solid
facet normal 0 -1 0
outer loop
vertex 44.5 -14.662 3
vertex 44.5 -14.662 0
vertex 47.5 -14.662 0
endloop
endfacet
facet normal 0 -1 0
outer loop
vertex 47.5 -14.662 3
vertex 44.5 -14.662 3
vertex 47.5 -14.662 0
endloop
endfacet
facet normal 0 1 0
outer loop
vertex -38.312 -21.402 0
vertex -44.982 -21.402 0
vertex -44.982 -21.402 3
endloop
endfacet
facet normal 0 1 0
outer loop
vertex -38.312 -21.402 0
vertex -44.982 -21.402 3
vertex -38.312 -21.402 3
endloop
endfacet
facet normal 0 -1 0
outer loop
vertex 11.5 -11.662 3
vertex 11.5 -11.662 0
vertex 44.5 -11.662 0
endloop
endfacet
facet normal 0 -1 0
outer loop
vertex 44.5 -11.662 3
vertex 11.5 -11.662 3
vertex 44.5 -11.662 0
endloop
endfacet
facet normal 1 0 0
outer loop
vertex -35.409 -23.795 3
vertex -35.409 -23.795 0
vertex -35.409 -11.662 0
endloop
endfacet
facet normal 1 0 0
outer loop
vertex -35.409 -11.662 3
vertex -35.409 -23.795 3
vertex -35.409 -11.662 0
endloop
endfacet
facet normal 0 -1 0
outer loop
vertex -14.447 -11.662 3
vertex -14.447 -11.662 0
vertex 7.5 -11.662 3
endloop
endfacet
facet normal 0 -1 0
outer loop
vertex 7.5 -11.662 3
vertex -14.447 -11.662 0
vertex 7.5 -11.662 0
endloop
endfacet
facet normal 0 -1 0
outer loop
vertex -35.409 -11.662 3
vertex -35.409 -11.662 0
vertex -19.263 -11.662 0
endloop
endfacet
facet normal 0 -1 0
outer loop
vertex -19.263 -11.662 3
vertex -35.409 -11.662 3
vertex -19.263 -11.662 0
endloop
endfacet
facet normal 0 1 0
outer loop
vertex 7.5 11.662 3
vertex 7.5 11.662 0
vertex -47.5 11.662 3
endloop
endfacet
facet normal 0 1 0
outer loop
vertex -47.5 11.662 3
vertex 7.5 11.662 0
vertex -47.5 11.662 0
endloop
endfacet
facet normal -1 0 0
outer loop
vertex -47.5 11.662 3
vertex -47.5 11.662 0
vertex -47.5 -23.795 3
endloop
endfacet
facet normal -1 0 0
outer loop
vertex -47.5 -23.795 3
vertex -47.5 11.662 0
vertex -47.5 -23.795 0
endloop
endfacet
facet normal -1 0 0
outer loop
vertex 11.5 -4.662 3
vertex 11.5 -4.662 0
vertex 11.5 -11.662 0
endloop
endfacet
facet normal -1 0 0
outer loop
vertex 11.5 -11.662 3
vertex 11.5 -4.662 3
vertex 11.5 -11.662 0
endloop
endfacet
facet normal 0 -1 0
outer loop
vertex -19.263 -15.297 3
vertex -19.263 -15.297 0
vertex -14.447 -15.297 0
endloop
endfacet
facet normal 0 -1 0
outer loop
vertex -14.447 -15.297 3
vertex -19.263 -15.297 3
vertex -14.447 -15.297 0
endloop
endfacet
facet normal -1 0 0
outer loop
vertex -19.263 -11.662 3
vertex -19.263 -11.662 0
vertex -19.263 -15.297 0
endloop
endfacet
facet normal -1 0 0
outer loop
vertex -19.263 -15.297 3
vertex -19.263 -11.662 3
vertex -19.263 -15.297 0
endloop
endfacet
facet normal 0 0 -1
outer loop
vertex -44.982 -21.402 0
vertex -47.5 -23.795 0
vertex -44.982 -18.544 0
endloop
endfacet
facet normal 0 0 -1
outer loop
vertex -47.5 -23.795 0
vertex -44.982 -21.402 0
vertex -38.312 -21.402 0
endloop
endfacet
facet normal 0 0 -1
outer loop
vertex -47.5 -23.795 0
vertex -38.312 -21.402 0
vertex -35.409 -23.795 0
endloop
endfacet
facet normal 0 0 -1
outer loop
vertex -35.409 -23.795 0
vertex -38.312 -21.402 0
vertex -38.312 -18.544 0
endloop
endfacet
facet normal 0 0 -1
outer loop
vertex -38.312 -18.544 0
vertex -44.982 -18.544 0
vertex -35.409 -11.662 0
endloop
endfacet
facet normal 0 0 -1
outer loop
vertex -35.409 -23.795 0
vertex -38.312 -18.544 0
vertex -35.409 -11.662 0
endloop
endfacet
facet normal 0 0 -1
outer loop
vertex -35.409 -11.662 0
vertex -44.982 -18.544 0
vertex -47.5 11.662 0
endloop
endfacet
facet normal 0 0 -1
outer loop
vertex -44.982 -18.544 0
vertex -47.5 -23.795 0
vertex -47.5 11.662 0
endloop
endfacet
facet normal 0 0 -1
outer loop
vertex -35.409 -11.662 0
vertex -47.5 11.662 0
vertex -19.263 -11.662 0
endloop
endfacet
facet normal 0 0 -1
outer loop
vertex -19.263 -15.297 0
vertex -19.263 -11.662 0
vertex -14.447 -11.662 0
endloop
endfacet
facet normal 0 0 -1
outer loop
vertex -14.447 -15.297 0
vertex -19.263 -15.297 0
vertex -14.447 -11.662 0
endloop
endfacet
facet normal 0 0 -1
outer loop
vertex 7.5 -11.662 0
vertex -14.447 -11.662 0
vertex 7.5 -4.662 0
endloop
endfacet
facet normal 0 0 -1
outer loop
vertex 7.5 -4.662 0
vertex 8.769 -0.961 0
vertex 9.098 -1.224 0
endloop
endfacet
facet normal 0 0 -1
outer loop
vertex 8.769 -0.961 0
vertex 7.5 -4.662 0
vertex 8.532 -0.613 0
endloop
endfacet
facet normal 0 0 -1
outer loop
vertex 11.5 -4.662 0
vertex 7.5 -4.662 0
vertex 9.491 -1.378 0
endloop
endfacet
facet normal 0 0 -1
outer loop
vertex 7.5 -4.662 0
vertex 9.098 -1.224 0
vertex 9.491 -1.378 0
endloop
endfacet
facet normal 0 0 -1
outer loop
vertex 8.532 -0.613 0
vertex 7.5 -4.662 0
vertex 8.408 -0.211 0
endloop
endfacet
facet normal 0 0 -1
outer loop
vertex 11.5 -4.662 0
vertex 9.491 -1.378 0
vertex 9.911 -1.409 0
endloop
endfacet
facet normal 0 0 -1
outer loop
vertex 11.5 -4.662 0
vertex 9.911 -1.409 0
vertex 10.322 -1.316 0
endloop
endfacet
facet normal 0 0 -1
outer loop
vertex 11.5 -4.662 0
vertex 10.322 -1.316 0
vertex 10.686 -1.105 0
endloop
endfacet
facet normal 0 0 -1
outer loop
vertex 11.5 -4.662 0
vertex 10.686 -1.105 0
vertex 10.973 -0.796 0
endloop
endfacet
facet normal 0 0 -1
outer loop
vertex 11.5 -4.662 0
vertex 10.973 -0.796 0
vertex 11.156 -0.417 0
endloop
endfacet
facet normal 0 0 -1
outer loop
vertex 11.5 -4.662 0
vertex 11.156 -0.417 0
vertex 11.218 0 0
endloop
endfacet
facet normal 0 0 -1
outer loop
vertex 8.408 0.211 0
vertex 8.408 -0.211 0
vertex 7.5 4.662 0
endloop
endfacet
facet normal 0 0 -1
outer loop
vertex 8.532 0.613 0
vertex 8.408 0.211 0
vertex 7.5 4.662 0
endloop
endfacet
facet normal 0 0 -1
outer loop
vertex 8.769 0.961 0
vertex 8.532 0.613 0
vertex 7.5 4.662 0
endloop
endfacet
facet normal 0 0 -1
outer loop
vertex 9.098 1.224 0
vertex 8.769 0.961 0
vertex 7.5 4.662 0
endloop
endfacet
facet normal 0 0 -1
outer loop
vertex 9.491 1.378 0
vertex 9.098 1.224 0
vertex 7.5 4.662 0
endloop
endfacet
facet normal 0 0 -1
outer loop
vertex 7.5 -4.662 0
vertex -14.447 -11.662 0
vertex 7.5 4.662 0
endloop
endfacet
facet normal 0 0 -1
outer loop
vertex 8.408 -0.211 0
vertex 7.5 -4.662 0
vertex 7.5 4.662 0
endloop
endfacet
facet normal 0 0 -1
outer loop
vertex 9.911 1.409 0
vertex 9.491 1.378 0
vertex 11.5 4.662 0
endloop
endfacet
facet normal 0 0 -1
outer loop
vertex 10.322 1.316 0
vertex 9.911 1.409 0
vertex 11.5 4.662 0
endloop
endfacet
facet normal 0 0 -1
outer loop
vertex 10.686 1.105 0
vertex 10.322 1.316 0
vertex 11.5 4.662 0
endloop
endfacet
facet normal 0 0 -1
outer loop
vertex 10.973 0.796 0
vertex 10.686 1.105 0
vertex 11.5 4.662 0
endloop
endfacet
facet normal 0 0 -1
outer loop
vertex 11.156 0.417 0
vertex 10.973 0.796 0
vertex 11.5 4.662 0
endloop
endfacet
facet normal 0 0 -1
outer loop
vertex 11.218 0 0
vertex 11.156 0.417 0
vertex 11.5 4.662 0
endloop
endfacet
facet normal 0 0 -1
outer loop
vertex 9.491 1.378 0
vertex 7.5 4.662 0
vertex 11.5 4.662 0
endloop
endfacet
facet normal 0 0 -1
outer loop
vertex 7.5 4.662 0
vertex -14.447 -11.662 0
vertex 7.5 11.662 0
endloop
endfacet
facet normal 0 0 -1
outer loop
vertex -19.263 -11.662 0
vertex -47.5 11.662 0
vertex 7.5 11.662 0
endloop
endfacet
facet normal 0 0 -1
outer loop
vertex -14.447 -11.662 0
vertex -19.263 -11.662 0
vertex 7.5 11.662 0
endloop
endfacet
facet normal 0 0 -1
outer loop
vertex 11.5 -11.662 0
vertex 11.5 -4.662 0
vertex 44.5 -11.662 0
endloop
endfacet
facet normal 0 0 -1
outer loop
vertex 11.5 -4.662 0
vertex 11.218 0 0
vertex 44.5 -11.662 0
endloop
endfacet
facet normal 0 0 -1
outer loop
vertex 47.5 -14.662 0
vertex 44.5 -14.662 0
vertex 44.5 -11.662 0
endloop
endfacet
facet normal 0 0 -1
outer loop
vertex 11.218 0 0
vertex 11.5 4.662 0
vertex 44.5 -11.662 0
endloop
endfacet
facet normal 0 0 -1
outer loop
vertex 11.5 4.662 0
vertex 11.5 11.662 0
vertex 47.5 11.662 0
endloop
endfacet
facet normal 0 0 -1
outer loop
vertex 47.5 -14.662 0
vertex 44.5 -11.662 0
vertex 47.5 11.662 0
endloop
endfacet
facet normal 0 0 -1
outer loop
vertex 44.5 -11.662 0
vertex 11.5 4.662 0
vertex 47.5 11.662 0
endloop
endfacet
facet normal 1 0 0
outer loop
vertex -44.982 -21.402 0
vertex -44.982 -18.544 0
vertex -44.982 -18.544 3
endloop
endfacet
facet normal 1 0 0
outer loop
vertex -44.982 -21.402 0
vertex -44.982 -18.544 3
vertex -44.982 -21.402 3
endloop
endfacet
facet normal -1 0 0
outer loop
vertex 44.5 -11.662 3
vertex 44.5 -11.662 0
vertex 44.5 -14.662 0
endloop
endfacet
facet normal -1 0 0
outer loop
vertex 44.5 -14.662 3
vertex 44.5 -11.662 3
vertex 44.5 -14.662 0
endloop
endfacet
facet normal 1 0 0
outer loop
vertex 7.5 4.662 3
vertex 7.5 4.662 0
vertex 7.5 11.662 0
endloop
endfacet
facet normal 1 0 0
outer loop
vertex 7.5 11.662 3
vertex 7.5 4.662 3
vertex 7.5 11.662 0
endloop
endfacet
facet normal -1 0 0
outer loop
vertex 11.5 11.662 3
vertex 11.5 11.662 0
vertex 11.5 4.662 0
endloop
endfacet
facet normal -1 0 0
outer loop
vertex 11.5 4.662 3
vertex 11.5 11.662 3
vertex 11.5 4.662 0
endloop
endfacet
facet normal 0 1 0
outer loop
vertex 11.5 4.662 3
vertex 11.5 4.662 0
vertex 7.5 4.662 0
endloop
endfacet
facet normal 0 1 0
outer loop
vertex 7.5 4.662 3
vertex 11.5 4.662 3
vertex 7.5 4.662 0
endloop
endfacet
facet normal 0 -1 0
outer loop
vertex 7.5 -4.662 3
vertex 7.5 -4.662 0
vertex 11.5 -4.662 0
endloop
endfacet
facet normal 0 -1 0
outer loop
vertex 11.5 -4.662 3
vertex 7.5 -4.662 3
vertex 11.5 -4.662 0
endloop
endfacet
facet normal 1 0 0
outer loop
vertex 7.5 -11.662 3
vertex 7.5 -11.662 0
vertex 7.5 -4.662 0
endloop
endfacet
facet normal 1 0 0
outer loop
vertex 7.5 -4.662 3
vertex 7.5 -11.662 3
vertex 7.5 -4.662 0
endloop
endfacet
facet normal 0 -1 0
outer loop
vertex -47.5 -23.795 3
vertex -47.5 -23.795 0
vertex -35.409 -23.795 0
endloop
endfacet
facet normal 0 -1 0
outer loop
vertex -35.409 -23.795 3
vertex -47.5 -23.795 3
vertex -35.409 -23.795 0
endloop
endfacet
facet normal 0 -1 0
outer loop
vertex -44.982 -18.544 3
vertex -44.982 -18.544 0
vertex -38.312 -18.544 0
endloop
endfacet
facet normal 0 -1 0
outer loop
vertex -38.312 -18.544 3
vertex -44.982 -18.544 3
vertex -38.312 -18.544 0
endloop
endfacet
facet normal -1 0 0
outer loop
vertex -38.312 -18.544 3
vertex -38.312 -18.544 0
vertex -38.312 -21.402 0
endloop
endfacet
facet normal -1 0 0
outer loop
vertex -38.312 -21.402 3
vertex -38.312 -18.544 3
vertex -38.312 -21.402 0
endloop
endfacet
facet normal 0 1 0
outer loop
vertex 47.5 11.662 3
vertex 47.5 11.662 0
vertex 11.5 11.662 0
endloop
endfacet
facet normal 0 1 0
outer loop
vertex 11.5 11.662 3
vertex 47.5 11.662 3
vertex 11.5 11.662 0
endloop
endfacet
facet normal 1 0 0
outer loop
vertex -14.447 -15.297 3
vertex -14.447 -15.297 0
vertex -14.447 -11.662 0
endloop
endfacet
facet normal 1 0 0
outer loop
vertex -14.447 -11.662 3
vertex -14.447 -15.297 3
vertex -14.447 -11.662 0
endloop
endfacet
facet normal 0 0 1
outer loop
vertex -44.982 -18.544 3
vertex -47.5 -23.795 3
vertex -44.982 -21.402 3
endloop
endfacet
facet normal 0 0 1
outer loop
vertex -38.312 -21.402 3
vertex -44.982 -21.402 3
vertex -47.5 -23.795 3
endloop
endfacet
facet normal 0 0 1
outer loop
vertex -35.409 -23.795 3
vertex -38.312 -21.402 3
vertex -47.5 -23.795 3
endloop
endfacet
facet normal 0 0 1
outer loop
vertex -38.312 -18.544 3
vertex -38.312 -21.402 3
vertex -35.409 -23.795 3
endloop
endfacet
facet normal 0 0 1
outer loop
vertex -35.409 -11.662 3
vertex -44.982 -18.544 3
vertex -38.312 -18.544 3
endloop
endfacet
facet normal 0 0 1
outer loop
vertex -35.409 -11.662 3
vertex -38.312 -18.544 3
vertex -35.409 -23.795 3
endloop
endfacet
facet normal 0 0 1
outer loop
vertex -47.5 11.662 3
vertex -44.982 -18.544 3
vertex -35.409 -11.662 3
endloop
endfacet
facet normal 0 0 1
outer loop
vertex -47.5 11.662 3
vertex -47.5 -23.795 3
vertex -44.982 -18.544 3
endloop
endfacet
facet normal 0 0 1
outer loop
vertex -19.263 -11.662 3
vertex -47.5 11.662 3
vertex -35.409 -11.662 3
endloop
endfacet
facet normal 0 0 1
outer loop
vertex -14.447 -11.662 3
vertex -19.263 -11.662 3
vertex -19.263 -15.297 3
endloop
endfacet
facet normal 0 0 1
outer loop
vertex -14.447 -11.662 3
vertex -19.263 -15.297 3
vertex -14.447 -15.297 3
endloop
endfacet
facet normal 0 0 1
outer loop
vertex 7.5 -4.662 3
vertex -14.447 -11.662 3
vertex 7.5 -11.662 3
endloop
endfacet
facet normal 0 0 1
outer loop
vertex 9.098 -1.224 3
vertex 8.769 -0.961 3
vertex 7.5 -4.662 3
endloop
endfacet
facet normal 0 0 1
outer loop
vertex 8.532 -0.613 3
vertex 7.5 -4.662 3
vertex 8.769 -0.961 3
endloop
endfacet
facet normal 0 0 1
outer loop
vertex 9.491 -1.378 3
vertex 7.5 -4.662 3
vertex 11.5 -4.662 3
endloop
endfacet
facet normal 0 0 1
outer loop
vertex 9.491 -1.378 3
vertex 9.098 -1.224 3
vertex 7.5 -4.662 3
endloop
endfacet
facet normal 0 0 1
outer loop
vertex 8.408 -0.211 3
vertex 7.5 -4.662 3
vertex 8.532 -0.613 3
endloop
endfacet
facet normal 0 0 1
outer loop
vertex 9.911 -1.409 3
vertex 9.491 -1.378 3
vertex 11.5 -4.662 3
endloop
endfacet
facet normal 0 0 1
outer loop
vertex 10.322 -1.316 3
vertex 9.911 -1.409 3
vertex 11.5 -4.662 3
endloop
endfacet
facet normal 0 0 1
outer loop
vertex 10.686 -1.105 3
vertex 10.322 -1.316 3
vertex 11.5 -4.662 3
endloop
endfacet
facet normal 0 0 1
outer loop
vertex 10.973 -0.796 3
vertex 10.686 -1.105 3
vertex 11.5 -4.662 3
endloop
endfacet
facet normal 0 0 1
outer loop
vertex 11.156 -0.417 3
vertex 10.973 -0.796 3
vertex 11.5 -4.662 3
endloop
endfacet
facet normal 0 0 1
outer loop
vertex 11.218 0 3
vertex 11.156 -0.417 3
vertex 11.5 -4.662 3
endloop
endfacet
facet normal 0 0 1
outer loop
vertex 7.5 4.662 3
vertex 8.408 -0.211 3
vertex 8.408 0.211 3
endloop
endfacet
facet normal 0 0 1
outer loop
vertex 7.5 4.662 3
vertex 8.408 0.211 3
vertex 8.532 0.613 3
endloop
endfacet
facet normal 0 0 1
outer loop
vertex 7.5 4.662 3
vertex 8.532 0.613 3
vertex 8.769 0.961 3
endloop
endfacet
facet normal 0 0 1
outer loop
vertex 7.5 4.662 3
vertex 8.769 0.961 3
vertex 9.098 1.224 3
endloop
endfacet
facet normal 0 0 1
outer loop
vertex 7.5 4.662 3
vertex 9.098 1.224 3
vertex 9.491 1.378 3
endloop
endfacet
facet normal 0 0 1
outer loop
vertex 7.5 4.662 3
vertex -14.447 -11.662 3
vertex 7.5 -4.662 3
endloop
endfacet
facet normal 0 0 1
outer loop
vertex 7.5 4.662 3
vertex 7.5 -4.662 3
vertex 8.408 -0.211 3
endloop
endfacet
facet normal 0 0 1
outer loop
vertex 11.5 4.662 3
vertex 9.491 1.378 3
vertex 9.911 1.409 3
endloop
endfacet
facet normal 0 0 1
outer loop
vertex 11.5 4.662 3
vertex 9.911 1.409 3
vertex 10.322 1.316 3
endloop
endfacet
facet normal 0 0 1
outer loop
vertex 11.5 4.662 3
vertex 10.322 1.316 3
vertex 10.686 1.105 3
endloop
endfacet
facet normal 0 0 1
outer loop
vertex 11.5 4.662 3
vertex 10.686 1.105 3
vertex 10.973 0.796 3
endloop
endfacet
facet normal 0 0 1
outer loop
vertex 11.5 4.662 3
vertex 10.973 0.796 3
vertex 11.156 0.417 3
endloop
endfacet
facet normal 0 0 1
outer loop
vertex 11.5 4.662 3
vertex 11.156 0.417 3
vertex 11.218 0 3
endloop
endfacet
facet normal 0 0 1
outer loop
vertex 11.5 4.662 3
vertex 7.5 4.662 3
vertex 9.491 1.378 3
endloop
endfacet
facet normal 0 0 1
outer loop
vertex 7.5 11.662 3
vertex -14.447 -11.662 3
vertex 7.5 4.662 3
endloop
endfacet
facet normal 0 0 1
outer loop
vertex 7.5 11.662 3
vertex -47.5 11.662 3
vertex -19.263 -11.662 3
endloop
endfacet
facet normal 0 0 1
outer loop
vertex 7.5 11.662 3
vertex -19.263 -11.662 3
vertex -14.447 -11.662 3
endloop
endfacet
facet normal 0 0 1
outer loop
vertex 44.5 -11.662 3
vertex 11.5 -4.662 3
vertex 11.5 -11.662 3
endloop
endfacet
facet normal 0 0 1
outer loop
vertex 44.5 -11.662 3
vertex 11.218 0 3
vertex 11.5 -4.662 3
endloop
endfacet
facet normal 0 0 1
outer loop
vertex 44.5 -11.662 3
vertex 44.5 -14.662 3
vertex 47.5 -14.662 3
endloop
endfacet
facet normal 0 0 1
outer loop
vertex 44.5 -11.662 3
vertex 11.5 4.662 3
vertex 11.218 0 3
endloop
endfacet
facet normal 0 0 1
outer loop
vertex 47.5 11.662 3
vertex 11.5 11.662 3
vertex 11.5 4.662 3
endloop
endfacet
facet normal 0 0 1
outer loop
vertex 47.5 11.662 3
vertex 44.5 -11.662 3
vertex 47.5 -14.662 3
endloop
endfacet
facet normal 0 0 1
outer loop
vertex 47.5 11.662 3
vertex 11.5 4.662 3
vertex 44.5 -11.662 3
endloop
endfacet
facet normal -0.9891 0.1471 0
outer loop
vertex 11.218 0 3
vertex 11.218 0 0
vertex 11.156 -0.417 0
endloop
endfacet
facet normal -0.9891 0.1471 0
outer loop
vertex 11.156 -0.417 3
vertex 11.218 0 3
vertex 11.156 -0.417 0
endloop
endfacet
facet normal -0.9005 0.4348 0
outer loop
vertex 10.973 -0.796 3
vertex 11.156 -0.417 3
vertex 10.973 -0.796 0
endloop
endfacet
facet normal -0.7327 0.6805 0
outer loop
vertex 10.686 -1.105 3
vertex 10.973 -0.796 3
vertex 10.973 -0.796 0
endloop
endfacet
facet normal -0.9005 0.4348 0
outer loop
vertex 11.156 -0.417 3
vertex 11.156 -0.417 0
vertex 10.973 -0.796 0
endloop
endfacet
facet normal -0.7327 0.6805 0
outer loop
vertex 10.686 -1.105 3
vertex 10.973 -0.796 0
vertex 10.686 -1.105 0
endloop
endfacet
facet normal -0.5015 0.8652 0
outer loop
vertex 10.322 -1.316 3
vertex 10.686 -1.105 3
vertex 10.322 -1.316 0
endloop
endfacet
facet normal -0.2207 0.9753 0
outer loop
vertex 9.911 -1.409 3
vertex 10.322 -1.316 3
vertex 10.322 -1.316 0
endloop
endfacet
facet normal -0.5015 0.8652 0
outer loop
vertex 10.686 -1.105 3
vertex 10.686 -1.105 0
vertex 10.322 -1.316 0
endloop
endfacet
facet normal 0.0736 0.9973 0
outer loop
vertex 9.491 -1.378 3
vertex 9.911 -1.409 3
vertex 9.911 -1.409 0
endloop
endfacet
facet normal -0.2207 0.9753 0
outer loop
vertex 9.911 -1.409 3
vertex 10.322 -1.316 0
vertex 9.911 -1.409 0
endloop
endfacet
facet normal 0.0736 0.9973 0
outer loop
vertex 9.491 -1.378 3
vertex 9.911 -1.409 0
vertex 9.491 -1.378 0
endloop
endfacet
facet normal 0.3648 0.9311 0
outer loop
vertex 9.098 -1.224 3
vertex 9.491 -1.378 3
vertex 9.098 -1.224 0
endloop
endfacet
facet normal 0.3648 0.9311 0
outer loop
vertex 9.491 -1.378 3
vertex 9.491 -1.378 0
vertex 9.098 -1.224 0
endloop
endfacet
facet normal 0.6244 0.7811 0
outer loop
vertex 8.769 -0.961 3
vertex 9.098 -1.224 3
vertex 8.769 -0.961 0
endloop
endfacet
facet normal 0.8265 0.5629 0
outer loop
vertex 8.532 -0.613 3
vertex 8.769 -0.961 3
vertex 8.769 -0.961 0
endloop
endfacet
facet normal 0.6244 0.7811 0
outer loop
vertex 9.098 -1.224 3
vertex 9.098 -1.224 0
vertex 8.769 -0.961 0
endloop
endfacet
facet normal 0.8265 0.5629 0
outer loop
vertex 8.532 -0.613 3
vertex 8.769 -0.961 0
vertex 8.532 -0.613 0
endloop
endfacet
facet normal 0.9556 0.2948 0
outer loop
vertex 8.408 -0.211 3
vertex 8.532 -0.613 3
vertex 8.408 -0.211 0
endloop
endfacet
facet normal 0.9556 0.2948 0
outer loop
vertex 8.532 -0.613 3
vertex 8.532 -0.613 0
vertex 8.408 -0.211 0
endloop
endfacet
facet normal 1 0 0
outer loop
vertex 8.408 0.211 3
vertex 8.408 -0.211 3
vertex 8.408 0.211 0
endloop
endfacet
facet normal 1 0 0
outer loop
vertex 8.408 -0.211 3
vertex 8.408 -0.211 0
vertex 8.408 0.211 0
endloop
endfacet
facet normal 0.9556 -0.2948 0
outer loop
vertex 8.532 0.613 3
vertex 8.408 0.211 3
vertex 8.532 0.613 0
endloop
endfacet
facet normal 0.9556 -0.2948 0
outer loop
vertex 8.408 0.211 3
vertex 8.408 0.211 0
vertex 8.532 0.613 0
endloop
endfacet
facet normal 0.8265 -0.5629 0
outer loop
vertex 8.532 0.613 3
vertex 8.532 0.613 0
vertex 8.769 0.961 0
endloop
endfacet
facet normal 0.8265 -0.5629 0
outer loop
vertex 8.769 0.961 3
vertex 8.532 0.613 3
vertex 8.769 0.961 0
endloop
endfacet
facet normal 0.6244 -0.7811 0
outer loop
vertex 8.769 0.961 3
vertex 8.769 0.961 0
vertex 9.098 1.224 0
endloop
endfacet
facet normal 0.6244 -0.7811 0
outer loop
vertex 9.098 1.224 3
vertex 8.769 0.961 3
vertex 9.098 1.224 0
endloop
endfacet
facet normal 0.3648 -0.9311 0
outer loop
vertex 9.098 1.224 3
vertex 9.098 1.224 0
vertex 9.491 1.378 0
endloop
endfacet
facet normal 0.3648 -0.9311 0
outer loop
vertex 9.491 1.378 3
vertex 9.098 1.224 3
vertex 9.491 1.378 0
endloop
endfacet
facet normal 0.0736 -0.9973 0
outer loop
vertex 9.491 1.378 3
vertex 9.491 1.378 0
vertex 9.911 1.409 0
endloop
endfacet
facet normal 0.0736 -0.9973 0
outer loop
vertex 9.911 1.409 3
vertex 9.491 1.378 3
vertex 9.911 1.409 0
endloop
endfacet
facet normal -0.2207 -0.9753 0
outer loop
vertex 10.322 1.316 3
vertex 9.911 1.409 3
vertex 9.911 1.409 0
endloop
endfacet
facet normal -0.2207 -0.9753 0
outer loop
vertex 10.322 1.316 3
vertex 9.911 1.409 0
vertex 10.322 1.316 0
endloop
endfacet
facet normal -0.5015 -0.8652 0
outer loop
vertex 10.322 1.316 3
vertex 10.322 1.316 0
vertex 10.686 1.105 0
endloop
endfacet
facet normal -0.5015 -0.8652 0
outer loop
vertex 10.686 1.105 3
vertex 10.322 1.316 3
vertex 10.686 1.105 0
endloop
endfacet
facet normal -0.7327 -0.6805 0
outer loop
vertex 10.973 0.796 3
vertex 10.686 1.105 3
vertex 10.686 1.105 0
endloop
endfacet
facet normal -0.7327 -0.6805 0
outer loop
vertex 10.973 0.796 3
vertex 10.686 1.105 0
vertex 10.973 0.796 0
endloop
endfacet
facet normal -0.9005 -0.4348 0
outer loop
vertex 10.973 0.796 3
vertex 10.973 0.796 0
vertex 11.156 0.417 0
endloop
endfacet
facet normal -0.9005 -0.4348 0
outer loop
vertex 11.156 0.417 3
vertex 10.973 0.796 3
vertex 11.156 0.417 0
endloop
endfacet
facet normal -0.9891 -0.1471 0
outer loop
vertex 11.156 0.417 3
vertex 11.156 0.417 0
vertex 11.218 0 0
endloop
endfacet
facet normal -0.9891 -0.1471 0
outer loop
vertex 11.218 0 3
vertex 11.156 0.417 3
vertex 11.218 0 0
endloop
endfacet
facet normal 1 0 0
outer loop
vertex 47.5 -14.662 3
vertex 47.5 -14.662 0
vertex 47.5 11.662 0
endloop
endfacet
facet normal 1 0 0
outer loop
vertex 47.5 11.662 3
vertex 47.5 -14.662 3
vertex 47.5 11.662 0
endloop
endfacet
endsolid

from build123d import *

# Parameters (mm, degrees)
F1_DEPTH = 3
F2_W     = 6.6697
F2_H     = 2.858443
F2_R     = 1.413331
F3_DEPTH = 25


with BuildPart() as f1:
    # F0 (on Top) → F1 (new body)
    with BuildSketch(Plane.XY):
        Polygon((7.5, 11.661676), (-47.5, 11.661676), (-47.5, -11.661676), (-47.5, -23.794964), (-35.409175, -23.794964), (-35.409175, -11.661676), (-19.262591, -11.661676), (-19.262591, -15.296764), (-14.446942, -15.296764), (-14.446942, -11.661676), (7.5, -11.661676), (7.5, -4.661676), (11.5, -4.661676), (11.5, -11.661676), (44.5, -11.661676), (44.5, -14.661676), (47.5, -14.661676), (47.5, -11.661676), (47.5, 11.661676), (11.5, 11.661676), (11.5, 4.661676), (7.5, 4.661676), align=None)
    extrude(amount=F1_DEPTH)

    # F2 (on face) → F3 (cut)
    with BuildSketch(Plane(origin=(0, 0, 0), x_dir=(1, 0, 0), z_dir=(0, 0, -1))):
        with Locations((-41.646808, 19.972993)):
            Rectangle(F2_W, F2_H)
        with Locations((9.805162, 0)):
            Circle(F2_R)
    extrude(amount=-F3_DEPTH, mode=Mode.SUBTRACT)


solid = f1.part
